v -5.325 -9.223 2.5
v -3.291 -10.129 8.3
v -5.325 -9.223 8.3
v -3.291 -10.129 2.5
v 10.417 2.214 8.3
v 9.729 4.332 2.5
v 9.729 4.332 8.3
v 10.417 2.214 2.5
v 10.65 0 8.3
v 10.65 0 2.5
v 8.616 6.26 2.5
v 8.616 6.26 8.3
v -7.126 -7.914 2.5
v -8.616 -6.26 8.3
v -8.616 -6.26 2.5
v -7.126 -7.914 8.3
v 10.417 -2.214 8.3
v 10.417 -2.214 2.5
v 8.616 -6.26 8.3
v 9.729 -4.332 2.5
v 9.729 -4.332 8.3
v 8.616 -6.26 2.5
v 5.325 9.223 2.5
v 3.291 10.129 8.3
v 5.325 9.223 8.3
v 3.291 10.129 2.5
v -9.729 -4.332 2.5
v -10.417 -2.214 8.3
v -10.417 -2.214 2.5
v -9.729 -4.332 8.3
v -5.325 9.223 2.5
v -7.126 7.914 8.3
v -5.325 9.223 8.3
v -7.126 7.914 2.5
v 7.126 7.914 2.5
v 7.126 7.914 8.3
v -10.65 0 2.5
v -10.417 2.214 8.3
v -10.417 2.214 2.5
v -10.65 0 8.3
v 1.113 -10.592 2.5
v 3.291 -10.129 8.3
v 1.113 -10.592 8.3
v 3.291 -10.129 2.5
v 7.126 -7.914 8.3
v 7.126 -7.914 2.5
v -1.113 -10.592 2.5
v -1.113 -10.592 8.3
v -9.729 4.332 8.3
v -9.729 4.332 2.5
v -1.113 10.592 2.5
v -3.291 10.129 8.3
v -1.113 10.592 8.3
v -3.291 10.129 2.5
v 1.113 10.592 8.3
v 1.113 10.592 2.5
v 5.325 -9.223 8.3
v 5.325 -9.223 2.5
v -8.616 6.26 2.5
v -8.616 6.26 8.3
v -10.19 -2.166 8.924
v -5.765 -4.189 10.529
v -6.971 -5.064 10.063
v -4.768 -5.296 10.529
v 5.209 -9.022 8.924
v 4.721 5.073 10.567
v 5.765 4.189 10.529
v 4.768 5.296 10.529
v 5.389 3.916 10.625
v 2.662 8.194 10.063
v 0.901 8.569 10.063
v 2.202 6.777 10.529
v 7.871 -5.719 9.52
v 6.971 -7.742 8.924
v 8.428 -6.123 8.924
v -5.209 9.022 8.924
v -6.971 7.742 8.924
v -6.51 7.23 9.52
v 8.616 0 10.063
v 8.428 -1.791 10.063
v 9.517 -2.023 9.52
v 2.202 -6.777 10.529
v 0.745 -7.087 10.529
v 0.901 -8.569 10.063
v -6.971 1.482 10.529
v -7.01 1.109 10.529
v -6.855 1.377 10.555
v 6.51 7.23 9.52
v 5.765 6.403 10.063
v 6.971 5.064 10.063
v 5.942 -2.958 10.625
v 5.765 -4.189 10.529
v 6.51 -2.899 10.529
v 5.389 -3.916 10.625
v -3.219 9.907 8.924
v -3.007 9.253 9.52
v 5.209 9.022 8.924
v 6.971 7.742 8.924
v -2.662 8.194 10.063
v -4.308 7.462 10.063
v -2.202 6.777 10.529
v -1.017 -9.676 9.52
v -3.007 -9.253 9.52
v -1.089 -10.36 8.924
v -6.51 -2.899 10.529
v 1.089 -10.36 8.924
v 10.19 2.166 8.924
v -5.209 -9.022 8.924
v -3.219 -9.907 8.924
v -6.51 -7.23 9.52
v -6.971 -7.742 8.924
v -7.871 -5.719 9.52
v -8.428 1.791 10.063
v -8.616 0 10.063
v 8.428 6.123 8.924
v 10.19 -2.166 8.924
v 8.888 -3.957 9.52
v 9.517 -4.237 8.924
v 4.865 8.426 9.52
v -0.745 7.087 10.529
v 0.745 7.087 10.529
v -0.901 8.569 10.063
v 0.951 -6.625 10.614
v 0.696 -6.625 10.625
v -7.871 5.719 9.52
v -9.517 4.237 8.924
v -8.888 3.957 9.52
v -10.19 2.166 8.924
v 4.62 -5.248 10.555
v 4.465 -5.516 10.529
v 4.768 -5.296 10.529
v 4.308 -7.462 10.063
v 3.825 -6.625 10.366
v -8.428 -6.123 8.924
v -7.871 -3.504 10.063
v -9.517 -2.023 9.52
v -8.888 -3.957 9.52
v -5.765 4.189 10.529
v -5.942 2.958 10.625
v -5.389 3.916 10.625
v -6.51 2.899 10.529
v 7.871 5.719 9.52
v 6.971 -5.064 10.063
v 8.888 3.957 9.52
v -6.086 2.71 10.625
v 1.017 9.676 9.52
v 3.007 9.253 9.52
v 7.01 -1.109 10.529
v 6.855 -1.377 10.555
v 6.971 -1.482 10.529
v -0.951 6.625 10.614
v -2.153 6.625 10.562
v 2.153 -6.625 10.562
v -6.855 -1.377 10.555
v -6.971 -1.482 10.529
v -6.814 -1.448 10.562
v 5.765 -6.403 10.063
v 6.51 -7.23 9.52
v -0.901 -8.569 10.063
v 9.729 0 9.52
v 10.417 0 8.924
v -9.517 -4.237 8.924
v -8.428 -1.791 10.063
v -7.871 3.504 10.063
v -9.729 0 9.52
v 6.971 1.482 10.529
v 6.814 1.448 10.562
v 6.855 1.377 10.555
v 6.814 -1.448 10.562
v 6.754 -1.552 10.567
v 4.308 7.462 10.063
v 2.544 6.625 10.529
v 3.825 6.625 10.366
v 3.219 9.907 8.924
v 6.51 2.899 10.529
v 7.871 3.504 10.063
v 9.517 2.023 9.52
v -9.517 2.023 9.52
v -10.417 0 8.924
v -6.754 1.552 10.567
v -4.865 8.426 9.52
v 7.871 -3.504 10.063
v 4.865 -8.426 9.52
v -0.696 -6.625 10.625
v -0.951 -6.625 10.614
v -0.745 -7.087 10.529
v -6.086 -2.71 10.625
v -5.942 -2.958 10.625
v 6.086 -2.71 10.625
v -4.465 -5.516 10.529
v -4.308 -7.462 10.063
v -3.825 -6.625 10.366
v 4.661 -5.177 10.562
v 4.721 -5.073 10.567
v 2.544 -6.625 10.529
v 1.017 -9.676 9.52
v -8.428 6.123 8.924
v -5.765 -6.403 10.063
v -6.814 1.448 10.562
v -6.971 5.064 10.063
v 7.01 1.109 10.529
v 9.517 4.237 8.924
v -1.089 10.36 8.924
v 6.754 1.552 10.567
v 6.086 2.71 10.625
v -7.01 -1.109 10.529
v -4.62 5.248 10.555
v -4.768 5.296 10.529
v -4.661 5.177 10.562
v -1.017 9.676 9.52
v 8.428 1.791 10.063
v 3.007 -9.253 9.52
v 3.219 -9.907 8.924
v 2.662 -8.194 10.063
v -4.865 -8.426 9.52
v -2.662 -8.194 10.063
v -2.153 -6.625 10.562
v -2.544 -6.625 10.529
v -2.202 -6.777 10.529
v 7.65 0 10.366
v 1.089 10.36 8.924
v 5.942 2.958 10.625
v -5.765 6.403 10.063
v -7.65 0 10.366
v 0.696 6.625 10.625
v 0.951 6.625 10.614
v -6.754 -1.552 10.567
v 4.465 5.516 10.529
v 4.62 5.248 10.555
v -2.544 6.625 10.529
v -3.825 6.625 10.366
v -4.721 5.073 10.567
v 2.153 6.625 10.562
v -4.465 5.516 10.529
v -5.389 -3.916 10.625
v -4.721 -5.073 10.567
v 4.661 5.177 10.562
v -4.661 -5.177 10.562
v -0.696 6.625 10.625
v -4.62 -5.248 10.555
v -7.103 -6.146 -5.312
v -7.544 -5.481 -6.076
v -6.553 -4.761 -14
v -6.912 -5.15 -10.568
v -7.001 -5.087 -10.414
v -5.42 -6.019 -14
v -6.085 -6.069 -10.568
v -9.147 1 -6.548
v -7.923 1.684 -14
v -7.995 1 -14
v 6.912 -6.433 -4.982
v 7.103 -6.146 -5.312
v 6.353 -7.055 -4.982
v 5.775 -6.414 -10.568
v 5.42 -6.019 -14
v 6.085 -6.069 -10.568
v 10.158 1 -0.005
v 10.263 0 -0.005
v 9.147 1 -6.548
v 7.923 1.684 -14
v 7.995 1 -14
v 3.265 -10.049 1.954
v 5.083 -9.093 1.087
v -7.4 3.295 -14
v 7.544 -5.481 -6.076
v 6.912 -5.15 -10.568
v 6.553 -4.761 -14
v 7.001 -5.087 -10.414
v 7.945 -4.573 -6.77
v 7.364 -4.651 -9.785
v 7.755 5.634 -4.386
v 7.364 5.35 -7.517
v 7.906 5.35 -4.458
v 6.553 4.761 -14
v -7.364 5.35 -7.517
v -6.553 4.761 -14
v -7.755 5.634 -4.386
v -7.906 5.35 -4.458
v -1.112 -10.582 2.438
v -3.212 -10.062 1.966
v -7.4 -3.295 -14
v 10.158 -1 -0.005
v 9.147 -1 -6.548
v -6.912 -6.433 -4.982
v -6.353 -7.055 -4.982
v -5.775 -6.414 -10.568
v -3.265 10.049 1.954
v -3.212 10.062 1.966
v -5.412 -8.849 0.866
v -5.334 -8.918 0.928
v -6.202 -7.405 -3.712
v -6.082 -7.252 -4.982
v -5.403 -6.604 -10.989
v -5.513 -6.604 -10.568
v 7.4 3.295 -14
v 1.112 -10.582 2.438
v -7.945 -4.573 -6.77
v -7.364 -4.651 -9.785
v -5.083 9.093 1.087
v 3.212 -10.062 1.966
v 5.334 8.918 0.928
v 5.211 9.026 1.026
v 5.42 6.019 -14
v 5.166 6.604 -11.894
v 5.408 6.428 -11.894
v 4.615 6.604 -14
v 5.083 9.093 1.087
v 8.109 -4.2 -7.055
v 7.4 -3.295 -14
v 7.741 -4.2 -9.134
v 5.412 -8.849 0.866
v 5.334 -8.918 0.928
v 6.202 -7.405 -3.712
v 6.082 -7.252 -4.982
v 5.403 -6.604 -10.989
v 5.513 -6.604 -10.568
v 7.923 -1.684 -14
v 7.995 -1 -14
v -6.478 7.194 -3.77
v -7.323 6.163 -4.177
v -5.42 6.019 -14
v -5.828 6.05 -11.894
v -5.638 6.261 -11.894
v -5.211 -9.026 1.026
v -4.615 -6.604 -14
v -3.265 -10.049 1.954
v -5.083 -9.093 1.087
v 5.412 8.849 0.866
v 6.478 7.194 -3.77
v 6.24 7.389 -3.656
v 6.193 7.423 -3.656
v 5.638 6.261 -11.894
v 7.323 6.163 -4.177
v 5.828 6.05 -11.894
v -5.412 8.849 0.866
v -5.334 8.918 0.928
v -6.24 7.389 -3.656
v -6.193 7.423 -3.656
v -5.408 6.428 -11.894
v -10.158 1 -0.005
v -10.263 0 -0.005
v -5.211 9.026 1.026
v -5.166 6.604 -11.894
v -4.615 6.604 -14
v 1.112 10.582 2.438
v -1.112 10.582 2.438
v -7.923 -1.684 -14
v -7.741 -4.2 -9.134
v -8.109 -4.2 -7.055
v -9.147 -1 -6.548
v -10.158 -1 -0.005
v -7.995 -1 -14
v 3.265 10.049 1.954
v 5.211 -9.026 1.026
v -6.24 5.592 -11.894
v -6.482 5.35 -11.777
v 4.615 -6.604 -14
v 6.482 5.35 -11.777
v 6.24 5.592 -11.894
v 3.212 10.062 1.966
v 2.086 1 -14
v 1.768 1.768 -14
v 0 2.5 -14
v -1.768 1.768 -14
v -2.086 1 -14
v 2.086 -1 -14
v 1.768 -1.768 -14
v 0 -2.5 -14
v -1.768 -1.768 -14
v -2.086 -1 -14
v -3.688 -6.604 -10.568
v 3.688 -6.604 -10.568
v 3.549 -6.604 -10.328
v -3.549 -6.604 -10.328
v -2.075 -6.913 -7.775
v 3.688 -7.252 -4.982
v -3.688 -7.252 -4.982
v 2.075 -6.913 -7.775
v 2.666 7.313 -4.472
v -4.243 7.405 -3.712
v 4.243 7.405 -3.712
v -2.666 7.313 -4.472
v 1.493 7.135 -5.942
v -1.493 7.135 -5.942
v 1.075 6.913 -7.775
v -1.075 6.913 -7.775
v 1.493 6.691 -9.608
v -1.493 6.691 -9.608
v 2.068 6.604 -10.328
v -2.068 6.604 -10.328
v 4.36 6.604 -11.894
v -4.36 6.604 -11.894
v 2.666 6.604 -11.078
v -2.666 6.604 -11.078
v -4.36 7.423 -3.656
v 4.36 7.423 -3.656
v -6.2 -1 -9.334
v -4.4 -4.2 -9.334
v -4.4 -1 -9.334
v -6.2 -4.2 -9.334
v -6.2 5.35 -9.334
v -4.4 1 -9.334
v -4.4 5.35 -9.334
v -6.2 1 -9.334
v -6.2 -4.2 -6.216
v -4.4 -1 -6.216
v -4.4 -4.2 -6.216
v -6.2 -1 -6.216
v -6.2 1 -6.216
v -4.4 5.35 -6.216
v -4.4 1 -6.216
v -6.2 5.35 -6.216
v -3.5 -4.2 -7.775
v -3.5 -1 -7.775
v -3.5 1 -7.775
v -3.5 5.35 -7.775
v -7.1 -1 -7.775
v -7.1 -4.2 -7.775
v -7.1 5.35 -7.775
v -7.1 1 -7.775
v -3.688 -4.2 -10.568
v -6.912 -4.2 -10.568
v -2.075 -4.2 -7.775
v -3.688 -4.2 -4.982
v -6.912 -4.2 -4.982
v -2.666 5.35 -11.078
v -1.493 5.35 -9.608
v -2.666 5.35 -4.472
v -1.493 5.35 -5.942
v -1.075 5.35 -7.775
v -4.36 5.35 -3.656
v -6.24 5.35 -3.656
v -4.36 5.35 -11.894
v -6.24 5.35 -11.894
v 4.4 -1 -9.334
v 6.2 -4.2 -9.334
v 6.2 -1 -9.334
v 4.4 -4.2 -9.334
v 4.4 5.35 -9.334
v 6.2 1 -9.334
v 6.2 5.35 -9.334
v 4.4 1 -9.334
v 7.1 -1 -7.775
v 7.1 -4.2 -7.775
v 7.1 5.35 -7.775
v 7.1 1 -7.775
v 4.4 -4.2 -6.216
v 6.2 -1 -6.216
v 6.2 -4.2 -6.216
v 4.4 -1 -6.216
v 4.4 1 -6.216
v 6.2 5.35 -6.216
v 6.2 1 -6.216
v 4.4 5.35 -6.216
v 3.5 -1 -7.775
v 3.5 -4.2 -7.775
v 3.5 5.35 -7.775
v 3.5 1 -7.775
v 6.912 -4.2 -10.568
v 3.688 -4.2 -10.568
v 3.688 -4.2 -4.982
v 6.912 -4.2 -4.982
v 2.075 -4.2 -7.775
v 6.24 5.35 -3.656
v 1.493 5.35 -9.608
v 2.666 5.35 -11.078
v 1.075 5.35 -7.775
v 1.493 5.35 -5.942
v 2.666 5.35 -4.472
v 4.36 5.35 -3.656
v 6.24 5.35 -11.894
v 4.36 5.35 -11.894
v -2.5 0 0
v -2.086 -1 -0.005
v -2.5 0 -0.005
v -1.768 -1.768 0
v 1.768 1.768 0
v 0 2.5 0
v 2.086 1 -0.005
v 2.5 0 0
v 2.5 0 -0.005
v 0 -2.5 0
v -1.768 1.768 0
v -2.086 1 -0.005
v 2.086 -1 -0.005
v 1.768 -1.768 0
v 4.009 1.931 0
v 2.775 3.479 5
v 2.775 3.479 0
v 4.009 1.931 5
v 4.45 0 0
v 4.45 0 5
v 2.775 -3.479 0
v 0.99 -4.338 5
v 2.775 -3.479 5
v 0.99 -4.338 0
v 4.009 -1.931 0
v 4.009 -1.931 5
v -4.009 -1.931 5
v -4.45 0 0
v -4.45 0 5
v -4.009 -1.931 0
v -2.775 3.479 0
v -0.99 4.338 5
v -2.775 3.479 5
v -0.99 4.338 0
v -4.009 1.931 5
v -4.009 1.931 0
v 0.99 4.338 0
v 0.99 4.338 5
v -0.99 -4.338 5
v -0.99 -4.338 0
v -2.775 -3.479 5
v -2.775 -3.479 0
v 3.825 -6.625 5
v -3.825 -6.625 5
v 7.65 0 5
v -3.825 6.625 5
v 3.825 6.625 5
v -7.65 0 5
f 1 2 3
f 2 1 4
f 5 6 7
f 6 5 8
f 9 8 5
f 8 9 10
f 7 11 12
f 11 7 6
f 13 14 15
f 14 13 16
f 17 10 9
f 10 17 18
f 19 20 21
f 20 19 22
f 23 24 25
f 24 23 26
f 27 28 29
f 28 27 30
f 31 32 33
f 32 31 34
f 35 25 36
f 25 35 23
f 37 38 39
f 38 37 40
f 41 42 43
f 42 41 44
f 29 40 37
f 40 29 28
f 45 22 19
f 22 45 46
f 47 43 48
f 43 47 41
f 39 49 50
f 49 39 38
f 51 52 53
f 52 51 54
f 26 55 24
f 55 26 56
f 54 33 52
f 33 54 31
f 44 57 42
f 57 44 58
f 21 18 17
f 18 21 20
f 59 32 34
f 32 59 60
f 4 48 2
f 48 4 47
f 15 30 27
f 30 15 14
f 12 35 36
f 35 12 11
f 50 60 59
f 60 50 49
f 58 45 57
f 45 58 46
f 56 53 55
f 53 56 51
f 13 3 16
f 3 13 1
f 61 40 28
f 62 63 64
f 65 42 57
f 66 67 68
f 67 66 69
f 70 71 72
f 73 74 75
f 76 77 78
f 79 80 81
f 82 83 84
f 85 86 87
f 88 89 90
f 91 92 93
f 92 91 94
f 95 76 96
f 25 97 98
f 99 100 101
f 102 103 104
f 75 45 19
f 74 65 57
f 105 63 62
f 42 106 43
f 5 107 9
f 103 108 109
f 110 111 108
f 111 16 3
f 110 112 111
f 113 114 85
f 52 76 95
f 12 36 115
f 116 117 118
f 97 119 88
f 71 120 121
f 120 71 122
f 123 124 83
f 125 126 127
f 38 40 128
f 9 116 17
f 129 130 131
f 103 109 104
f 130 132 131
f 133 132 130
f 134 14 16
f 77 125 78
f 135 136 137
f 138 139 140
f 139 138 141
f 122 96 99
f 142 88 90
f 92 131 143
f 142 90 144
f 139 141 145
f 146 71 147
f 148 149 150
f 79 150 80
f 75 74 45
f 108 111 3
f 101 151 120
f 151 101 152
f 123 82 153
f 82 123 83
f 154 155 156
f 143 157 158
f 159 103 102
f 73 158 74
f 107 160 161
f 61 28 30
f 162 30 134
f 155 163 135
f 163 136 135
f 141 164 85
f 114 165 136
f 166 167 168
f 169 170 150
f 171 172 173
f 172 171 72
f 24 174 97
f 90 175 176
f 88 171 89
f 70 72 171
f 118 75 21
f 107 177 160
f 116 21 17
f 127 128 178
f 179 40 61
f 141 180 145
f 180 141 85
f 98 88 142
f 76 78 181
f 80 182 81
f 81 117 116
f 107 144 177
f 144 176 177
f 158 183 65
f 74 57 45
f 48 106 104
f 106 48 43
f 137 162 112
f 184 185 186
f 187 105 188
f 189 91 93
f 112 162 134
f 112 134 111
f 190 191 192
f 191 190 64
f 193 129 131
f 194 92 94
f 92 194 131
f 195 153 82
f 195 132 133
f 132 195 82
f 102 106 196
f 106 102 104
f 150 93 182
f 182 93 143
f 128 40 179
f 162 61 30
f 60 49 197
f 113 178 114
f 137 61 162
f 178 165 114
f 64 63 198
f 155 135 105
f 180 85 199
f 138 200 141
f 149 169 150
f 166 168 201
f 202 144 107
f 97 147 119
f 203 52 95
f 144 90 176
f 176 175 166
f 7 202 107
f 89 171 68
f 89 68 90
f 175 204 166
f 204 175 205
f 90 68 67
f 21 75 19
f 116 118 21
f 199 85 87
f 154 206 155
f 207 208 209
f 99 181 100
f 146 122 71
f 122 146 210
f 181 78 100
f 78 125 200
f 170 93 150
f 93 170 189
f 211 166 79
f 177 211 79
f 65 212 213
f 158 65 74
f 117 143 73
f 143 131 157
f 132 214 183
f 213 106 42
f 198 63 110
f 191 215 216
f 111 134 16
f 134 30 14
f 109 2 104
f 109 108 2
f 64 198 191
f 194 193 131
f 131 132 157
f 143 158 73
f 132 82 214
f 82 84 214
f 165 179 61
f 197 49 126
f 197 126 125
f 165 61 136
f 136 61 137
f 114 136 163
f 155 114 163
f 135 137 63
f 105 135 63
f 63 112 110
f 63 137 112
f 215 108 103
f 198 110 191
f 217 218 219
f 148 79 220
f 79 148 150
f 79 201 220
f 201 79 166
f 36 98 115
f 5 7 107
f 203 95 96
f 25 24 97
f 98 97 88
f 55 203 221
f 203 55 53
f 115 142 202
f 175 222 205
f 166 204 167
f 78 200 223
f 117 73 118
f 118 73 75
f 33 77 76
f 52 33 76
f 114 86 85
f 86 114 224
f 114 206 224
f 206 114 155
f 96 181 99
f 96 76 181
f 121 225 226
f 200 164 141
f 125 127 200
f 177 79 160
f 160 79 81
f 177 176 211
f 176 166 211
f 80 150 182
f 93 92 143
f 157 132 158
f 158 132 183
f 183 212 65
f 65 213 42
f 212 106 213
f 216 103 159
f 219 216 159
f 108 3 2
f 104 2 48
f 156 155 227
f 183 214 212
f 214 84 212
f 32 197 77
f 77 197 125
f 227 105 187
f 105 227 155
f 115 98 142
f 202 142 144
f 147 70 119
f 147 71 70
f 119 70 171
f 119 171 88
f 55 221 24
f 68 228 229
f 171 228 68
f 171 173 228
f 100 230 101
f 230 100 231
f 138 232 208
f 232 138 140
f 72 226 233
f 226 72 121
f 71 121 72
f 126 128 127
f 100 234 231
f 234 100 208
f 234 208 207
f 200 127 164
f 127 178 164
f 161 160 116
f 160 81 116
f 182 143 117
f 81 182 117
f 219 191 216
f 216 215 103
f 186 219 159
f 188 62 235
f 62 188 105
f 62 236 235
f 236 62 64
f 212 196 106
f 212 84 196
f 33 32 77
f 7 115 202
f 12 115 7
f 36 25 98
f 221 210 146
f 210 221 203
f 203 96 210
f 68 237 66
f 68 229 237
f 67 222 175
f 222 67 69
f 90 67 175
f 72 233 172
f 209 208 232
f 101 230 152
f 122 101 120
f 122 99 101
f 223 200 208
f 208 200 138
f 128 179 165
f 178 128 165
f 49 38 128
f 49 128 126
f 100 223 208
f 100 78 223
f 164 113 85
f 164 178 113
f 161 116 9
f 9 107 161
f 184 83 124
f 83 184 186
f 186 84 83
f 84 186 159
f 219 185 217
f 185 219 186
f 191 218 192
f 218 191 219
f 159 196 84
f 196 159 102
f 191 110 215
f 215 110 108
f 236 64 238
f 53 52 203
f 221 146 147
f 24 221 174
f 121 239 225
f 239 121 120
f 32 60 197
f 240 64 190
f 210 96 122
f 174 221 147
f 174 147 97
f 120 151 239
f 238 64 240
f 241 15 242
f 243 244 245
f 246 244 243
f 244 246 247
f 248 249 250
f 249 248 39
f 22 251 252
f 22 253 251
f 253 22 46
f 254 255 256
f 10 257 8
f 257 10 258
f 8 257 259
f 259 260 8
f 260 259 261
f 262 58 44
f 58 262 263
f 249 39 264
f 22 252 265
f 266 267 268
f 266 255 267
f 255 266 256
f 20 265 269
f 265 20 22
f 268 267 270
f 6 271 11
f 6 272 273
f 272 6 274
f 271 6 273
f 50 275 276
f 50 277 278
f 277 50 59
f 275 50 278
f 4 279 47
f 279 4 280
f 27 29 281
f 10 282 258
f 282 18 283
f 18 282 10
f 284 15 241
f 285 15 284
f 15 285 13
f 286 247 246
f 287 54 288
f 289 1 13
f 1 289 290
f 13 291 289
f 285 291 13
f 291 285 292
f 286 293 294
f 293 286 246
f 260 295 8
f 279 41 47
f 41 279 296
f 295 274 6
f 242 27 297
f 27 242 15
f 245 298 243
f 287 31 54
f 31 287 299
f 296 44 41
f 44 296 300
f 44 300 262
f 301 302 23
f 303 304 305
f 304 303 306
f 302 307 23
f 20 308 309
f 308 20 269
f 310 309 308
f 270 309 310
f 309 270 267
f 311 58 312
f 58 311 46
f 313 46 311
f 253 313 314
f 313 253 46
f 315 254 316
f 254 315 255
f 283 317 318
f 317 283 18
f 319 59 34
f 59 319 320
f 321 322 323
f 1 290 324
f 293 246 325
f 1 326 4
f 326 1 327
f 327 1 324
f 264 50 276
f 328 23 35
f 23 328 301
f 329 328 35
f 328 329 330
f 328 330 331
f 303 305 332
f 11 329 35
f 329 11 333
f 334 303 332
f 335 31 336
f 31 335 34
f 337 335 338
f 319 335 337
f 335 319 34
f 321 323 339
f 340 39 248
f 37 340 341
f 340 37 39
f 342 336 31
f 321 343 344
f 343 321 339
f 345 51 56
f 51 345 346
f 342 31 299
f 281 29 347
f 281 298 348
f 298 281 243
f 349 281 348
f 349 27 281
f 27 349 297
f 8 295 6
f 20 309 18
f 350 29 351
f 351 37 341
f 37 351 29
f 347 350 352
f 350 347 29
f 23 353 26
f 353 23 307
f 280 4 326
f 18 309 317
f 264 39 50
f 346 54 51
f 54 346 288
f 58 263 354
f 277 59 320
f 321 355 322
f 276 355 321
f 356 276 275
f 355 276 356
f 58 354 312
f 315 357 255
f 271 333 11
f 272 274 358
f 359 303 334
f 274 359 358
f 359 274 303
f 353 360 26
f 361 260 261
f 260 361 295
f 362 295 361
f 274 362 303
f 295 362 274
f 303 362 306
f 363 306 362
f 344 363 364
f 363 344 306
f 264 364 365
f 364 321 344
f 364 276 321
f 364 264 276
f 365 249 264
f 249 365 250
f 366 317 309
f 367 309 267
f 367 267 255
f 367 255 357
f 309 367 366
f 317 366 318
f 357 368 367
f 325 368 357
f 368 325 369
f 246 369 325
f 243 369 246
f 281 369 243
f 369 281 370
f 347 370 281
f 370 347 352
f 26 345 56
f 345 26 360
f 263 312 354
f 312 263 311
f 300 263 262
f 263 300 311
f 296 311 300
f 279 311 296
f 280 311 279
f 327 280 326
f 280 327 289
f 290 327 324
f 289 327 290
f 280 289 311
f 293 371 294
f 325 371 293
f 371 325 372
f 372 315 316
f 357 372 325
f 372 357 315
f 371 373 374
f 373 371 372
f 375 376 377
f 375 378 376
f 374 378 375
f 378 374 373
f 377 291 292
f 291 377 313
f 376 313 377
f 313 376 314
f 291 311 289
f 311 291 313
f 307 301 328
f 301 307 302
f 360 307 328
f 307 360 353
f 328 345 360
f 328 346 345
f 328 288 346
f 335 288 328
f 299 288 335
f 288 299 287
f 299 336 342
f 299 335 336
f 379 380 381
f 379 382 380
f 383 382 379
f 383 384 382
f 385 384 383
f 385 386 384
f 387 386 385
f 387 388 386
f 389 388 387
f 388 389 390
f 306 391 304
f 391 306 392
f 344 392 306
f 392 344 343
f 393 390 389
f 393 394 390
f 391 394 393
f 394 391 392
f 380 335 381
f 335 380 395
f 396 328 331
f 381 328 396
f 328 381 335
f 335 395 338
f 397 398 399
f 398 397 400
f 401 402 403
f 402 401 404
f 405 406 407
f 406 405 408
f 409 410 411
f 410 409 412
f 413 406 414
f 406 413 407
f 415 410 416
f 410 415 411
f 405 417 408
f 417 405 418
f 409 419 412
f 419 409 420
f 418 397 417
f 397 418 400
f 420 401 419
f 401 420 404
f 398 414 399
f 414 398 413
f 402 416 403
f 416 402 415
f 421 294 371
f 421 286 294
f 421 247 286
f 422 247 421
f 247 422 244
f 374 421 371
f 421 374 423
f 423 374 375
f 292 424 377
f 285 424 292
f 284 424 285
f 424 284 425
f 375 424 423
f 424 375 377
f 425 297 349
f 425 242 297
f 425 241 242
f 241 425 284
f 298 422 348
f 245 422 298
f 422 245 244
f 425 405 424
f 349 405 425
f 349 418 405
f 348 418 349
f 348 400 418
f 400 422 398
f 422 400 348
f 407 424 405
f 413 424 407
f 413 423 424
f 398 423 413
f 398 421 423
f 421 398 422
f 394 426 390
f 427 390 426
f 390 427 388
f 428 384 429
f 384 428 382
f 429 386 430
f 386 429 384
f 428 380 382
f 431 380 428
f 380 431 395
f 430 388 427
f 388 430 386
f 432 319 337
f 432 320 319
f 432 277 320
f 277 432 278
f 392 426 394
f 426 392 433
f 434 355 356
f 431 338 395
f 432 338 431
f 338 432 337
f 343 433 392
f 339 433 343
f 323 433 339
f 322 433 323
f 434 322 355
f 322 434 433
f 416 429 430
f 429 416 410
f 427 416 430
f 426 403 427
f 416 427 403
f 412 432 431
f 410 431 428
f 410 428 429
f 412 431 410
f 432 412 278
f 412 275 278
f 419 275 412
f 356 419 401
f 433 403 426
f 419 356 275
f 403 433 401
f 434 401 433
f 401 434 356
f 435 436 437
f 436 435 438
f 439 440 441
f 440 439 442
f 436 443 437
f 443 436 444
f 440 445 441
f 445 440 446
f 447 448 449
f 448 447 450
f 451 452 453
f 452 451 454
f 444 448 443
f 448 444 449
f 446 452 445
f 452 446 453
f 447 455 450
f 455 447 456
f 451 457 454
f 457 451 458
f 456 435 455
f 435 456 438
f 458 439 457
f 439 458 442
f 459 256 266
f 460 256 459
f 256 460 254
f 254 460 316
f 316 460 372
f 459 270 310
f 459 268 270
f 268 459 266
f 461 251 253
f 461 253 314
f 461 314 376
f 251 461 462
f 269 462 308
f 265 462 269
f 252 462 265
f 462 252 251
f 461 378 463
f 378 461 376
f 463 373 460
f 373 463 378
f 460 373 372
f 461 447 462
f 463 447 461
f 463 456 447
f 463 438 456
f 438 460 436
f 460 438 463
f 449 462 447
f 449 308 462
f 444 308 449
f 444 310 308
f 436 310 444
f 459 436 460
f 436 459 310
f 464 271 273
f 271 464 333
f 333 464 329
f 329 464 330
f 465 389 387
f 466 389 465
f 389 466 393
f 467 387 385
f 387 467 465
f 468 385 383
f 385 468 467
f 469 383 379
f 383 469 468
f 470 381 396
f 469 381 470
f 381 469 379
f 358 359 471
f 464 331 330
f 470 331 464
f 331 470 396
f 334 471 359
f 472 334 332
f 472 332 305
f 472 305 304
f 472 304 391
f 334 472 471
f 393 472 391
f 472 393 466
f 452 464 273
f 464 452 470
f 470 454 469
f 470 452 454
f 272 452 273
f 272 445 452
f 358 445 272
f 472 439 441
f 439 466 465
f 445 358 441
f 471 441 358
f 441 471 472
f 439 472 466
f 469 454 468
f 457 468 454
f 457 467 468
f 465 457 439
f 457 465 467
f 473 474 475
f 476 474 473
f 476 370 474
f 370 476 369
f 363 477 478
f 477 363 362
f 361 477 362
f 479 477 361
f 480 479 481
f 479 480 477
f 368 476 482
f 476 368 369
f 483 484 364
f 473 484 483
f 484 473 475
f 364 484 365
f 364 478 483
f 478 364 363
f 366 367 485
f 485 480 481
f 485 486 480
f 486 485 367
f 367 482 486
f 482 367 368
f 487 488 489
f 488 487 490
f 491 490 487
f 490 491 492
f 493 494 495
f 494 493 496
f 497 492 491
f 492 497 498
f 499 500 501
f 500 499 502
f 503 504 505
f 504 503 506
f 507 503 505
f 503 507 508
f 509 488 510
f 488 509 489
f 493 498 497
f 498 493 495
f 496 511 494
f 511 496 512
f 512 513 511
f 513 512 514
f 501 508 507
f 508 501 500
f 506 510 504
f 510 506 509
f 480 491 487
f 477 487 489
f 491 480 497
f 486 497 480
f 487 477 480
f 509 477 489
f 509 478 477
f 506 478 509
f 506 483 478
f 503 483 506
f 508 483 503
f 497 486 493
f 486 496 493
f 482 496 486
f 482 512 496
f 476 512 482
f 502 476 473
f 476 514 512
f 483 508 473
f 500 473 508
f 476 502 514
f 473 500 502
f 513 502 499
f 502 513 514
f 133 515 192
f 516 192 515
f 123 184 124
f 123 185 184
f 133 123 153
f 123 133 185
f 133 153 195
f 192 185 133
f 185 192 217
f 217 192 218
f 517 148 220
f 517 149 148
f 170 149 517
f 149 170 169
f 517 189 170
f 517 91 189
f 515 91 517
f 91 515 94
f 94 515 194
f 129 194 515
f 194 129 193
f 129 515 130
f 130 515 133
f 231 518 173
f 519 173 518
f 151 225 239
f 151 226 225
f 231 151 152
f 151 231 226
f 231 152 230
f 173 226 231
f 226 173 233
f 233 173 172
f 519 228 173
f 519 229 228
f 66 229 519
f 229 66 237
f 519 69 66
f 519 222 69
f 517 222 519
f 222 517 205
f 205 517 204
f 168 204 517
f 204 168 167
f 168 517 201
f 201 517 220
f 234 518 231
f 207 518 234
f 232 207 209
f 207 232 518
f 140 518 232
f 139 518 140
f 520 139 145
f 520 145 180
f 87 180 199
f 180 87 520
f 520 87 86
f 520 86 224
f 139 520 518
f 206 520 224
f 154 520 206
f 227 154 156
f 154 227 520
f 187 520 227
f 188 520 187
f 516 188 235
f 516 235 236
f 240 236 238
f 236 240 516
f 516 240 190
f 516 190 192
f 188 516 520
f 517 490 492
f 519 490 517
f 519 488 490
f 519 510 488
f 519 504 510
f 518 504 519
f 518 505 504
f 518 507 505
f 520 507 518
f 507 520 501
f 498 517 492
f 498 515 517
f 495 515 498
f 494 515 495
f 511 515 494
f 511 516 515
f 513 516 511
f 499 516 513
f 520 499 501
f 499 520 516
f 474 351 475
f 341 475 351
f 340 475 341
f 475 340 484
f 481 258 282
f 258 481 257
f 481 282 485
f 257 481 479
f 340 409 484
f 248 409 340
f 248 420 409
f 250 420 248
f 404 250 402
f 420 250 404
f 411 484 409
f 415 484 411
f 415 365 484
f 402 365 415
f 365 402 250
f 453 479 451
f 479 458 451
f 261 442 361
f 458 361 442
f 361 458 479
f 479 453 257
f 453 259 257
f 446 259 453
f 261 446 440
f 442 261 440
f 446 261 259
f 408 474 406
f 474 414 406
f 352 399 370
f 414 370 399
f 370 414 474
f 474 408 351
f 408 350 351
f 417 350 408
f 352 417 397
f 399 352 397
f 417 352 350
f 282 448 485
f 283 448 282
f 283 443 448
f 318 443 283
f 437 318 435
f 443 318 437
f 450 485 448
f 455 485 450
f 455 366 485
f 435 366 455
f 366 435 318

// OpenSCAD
// file: teardrop.scad
module teardrop (r=4.5,h=20,top_and_bottom=false)
{
	rotate([-270,0,90])
	linear_extrude(height=h,convexity=10)
	{
		circle(r=r);
		polygon(points=[[0,0],[r*cos(30),r*sin(30)],[0.5*r,r],[-0.5*r,r],[-r*cos(30),r*sin(30)]],
				paths=[[0,1,2,3,4]]);
		if (top_and_bottom)
		polygon(points=[[0,0],[r*cos(30),-r*sin(30)],[0.5*r,-r],[-0.5*r,-r],[-r*cos(30),-r*sin(30)]],
				paths=[[0,1,2,3,4]]);
		
	}
}

module teardropcentering (r=4.5,h=20)
{
	rotate([-270,0,90])
	linear_extrude(height=h)
	{
		circle(r=r, $fn = 24);
		polygon(points=[[0,0],[r*cos(30),r*sin(30)],[0.5*r,1.2*r],[-0.5*r,1.2*r],[-r*cos(30),r*sin(30)]],
				paths=[[0,1,2,3,4]]);
	}
}

module teardropcentering2 (r=4.5,h=20)
{
	//rotate([-270,0,90])
	difference(){
	linear_extrude(height=h)
	{
		circle(r=r, $fn = 24);
		polygon(points=[[0,0],[r*cos(30),r*sin(30)],[0.5*r,1.2*r],[-0.5*r,1.2*r],[-r*cos(30),r*sin(30)]],
				paths=[[0,1,2,3,4]]);
	}
	translate(v = [-1.5*r, -1.5*r,-1])cube(size =[3*r,1.5*r,h+2]);
	}
}
// file: barbell.scad
/*
 *  This program is free software; you can redistribute it and/or modify
 *  it under the terms of the GNU General Public License as published by
 *  the Free Software Foundation; either version 3 of the License,
 *  LGPL version 2.1, or (at your option) any later version of the GPL.
 *
 *  This program is distributed in the hope that it will be useful,
 *  but WITHOUT ANY WARRANTY; without even the implied warranty of
 *  MERCHANTABILITY or FITNESS FOR A PARTICULAR PURPOSE.  See the
 *  GNU General Public License for more details.
 *
 *  You should have received a copy of the GNU General Public License
 *  along with this program; if not, write to the Free Software
 *  Foundation, Inc., 59 Temple Place, Suite 330, Boston, MA 02111-1307 USA
 *
*/

module barbell (r1,r2,r3,r4,separation) 
{
	x1=[0,0];
	x2=[separation,0];
	x3=triangulate (x1,x2,r1+r3,r2+r3);
	x4=triangulate (x2,x1,r2+r4,r1+r4);
	render()
	difference ()
	{
		union()
		{
			translate(x1)
			circle (r=r1);
			translate(x2)
			circle(r=r2);
			polygon (points=[x1,x3,x2,x4]);
		}
		translate(x3)
		circle(r=r3,$fa=5);
		translate(x4)
		circle(r=r4,$fa=5);
	}
}


function triangulate (point1, point2, length1, length2) = 
point1 + 
length1*rotated(
atan2(point2[1]-point1[1],point2[0]-point1[0])+
angle(distance(point1,point2),length1,length2));

function distance(point1,point2)=
sqrt((point1[0]-point2[0])*(point1[0]-point2[0])+
(point1[1]-point2[1])*(point1[1]-point2[1]));

function angle(a,b,c) = acos((a*a+b*b-c*c)/(2*a*b)); 

function rotated(a)=[cos(a),sin(a),0];
// file: utilities.scad
/*
 * Utility functions.
 *
 * Originally by Hans Häggström, 2010.
 * Dual licenced under Creative Commons Attribution-Share Alike 3.0 and LGPL2 or later
 */

//include <units.scad>


/******************** Disance Poins ******************************/
function distance3D(a,b) =sqrt( (a[0] - b[0])*(a[0] - b[0]) +
                                (a[1] - b[1])*(a[1] - b[1]) +
                                (a[2] - b[2])*(a[2] - b[2]) );
//Obsolet
function distance(a, b) = distance3D(a,b);

function distance2D(a,b) = sqrt( (a[0] - b[0])*(a[0] - b[0]) +
                                (a[1] - b[1])*(a[1] - b[1]));
								
function distance1D(a,b) = sqrt(a*a+b*b);
//Obsolet
function length2(a) = distance1D(a[0],a[1]);


/************************ vector *************************/
function normalized(a) = a / (max(distance3D([0,0,0], a), 0.00001));

function normalized_axis(a) = a == "x" ? [1, 0, 0]:
                   a == "y" ? [0, 1, 0]:
                   a == "z" ? [0, 0, 1]: normalized(a);

function angleOfNormalizedVector(n) = [0, -atan2(n[2], distance1D([n[0], n[1]])), atan2(n[1], n[0]) ];

function angle(v) = angleOfNormalizedVector(normalized(v));

function angleBetweenTwoPoints(a, b) = angle(normalized(b-a));

function _angleVectore2D(a) = atan2(a[0],a[1]);
function angle_betweentTwoPoints2D (a,b) = _angleVectore2D(b-a);


/********************** Circel ***************************/

function circel_area(r) = PI * r * r;

function circel_radius3Points(a,b,c) = (distance2D(a,b) * distance2D(b,c) * distance2D(c,a)) / (4 * triangle_area3Points(a,b,c));

function circel_radius3lengths(a,b,c) = (a*b*c) / (4 * triangle_area3lengths(a,b,c));


/********************** triangle **************************/
//Satz des Heron
function triangle_area3lengths(a,b,c) = sqrt((a+b+c)*(a+b-c)*(b+c-a)*(c+a-b))/4;

function triangle_area3Points(a,b,c) = triangle_area3lengths(distance2D(a,b),distance2D(b,c),distance2D(c,a));



/************************** coordinate systems translation ****/
//[radius,phi] <=> [x,y]
function conv2D_cartesian2polar(x) = [ distance1D(x[0],x[1]) , atan2(x[1],x[0]) ];
function conv2D_polar2cartesian(x) = [ x[0]*cos(x[1]) , x[0]*sin(x[1]) ];


CENTER = 0;
LEFT = -0.5;
RIGHT = 0.5;
TOP = 0.5;
BOTTOM = -0.5;

FlatCap =0;
ExtendedCap =0.5;
CutCap =-0.5;


module fromTo(from=[0,0,0], to=[1,0,0], size=[1, 1], align=[CENTER, CENTER], material=[0.5, 0.5, 0.5], name="", endExtras=[0,0], endCaps=[FlatCap, FlatCap], rotation=[0,0,0], printString=true) {

  angle = angleBetweenTwoPoints(from, to);
  length = distance(from, to) + endCaps[0]*size[0] + endCaps[1]*size[0] + endExtras[0] + endExtras[1];

  if (length > 0) {
    if (printString) echo(str( "  " ,name, " ", size[0], "mm x ", size[1], "mm, length ", length, "mm"));

    color(material)
      translate(from)
        rotate(angle)
          translate( [ -endCaps[0]*size[0] - endExtras[0], size[0]*(-0.5-align[0]), size[1]*(-0.5+align[1]) ] )
            rotate(rotation)
              scale([length, size[0], size[1]]) child();
  }
}

module part(name) {
  echo("");
  echo(str(name, ":"));
}
// file: roundEdges.scad
/* roundEdges
 * Copyright (c) 2012 by Krallinger Sebastian [s.krallinger+cc@gmail.com]
 * Dual-licensed under 
 * Creative Commons Attribution-ShareAlike 3.0 (CC BY-SA) [http://creativecommons.org/licenses/by-sa/3.0/]
 * and
 * LGPL v2 or later [http://www.gnu.org/licenses/].
 */


//Rounded Edges
module roundEdge(_a=0,_r=1,_l=1,_fn=100){
	rotate (a=[0,0,_a]){
		translate(v=[_r,_r,0]){
			rotate (a=[0,0,0]) rotate (a=[0,0,180]){
				difference() {
					translate (v=[-OS/2,-OS/2,-OS/2])
						cube (size = [_r+OS,_r+OS,_l+OS],center=false );
					translate (v=[0,0,-OS*2/2])
						cylinder (h = _l+OS*2, r=_r, center = false, $fn=_fn);
				}
			}
		}
	}
}
//roundEdge(_a=0,_l=10);
// file: metric.scad
// PRUSA Mendel  
// Default metric sizes
// GNU GPL v2
// Josef Průša
// josefprusa@me.com
// prusadjs.cz
// http://www.reprap.org/wiki/Prusa_Mendel
// http://github.com/prusajr/PrusaMendel

// RODS

threaded_rod_diameter      = 8.2;
smooth_bar_diameter        = 8;

// Nuts and bolts
// For all nuttraps and screw holse 
m8_diameter                = 8.9;
m8_nut_diameter            = 15.3;
m8_nut_wallDist            = _wallDistFromDia(m8_nut_diameter);
m8_nut_heigth              = 6.3;

m4_diameter                = 4.5;
m4_nut_diameter            = 8.2;
m4_nut_heigth              = 3.2;

m3_diameter                = 3.6;
m3_nut_diameter            = 6.45;
m3_nut_heigth              = 2.3;
m3_nut_wallDist            = _wallDistFromDia(m3_nut_diameter);
m3_nut_diameter_horizontal = 6.1;

// elongetaed nuttraps
// where a nut is put in an slot and inthere hits the perpendicular threadhole
m3_elongNtt_tolerance      = [0.5,0,0.5];// additional [diameter,depth,height]  // depth is not implemented


/******************************************************************************/ 
/*                                  INTERNAL                                  */
/******************************************************************************/
/*-----------------!!! do not change things below this !!!--------------------*/
m3_elongNtt_diameter = m3_nut_diameter + m3_elongNtt_tolerance[0];
m3_elongNtt_wallDist = _wallDistFromDia(m3_elongNtt_diameter);
m3_elongNtt_height = m3_nut_heigth + m3_elongNtt_tolerance[2];



function _wallDistFromDia(dia) = cos(30)*dia;
// file: units.scad
/*
 * Basic units.
 * 
 * Originally by Hans Häggström, 2010.
 * Dual licenced under Creative Commons Attribution-Share Alike 3.0 and LGPL2 or later
 */


mm = 1;
cm = 10 * mm;
dm = 100 * mm;
m = 1000 * mm;

inch = 25.4 * mm;

X = [1, 0, 0];
Y = [0, 1, 0];
Z = [0, 0, 1];

M3 = 3*mm;
M4 = 4*mm;
M5 = 5*mm;
M6 = 6*mm;
M8 = 8*mm;


// When a small distance is needed to overlap shapes for boolean cutting, etc.
epsilon = 0.01*mm;
OS = epsilon;  // Over size
// main file
/* H-Z-Coupling [Zc]
 * Copyright (c) 2012 by Krallinger Sebastian [s.krallinger+cc@gmail.com]
 * Dual-licensed under 
 * Creative Commons Attribution-ShareAlike 3.0 (CC BY-SA) [http://creativecommons.org/licenses/by-sa/3.0/]
 * and
 * LGPL v2 or later [http://www.gnu.org/licenses/].
 */

include <units.scad>;
include <metric.scad>
include <roundEdges.scad>
include <utilities.scad>
include <barbell.scad>
use <teardrop.scad>


/*------------------------------------general---------------------------------*/
Zc_mode = "-";
//Zc_mode = "printSet";  $fn=24*4;    // can be print or inspect [overlays the Zc_model with the original Zc_model] (uncomment next line)
//Zc_mode = "print";  $fn=24*4;
Zc_mode = "inspect";
//Zc_mode = "assembly";

Zc_thinWallThickness         = 1;
Zc_genWallThickness          = 3;
Zc_strongWallThickness       = 9;

Zc_horizontalSuportThickness = 0.3;
Zc_verticalSupportThickness  = 0.5;


Zc_shaftNut_dist          = 5; // distance between end of motor shaft and the lower edge of the first nut
Zc_slot_width             = 2; 

/*------------------------------------rod-------------------------------------*/
Zc_rod_diam               = m8_diameter;
Zc_nut_diam               = m8_nut_diameter;
Zc_nut_height             = m8_nut_heigth;

/*------------------------------------motor-----------------------------------*/
Zc_motorShaft_diam        = 5;
Zc_motorShaftCover_length = 14;

/*------------------------------------screw-----------------------------------*/
Zc_screwHolde_diam        = m3_diameter;
Zc_screwNut_diam          = m3_nut_diameter;
ZC_screwNut_height        = m3_nut_heigth;
Zc_screwNut_clearency     = 1;

/******************************************************************************/ 
/*                                  INTERNAL                                  */
/******************************************************************************/
_Zc_overalHeight         = Zc_nut_height + Zc_shaftNut_dist + Zc_motorShaftCover_length;
_Zc_outer_r              = Zc_nut_diam/2+Zc_genWallThickness;

_Zc_slotYdirWall_offset  = Zc_slot_width/2 + Zc_motorShaft_diam/2 + Zc_genWallThickness;

_Zc_coutout_r            = _Zc_outer_r - _Zc_slotYdirWall_offset;
_Zc_zdirCutout_scale     = (Zc_motorShaftCover_length+Zc_shaftNut_dist/2)/_Zc_coutout_r;

_Zc_zdirTopCloseOf_scale = (Zc_genWallThickness)/_Zc_outer_r;

module H_Z_Coupling() {

	intersection() {
		difference() {
			union(){
				// upper oultine
				translate([0, 0, Zc_shaftNut_dist/2]) 
					cylinder(r=_Zc_outer_r, h=Zc_nut_height + Zc_shaftNut_dist/2 - Zc_genWallThickness, center=false);

				// upper close off
				translate([0, 0, Zc_shaftNut_dist+Zc_nut_height - Zc_genWallThickness]) 
				scale([1, 1, _Zc_zdirTopCloseOf_scale]) 
					sphere(r=_Zc_outer_r);

				// lower outline
				translate([0, 0, -Zc_motorShaftCover_length]) 
					cylinder(r1=Zc_motorShaft_diam/2 + Zc_thinWallThickness+Zc_screwHolde_diam+Zc_thinWallThickness, r2=_Zc_outer_r, h=Zc_motorShaftCover_length+Zc_shaftNut_dist/2, center=false);
			}
			union(){
				// material coutout
				translate([0, 0, -Zc_motorShaftCover_length]) 
				for (y=[-_Zc_outer_r,_Zc_outer_r]) 
				translate([0, y, 0]) 
				scale([1, 1, _Zc_zdirCutout_scale]) 
				rotate(a=90,v=Y) 
					cylinder(r=_Zc_coutout_r, h=5*Zc_nut_diam, center=true);

				// motorshaft
				translate([0, 0, -Zc_motorShaftCover_length-OS]) 
					cylinder(r=Zc_motorShaft_diam/2, h=Zc_motorShaftCover_length+2*OS, center=false);

				//zaxis
				cylinder(r=Zc_rod_diam/2, h=Zc_nut_height + Zc_shaftNut_dist +OS, center=false);

				// nut coutout
				translate([0, 0, Zc_shaftNut_dist]) 
					cylinder(r=m8_nut_diameter/2, h=Zc_nut_height+OS, center=false,$fn=6);

				// slot
				translate([0, 0, -Zc_motorShaftCover_length/2-OS]) 
				cube(size=[5*Zc_nut_diam, Zc_slot_width, Zc_motorShaftCover_length+OS], center=true);

				// screw holse
				translate([0, 0, -Zc_motorShaftCover_length+Zc_genWallThickness+Zc_screwNut_diam/2]) 
				for (x=[-Zc_motorShaft_diam/2-Zc_thinWallThickness- Zc_screwHolde_diam/2,Zc_motorShaft_diam/2 + Zc_thinWallThickness+Zc_screwHolde_diam/2]) {
					//screw holes
					translate([x, 0, 0]) 
					rotate(a=90,v=X)
						cylinder(r=Zc_screwHolde_diam/2, h=5*Zc_nut_diam, center=true); 

					// nuttrap
					translate([x, -Zc_nut_diam*2.5- _Zc_slotYdirWall_offset + ZC_screwNut_height , 0]) 
					rotate(a=90,v=X)
						cylinder(r=Zc_screwNut_diam/2, h=5*Zc_nut_diam, center=true,$fn=6); 

					// nut clearany
					translate([x, Zc_nut_diam*2.5+ _Zc_slotYdirWall_offset -ZC_screwNut_height/2, 0]) 
					rotate(a=90,v=X)
						cylinder(r=Zc_screwNut_diam/2 + Zc_screwNut_clearency, h=5*Zc_nut_diam, center=true); 
				}
			}
		}
		translate([-Zc_nut_diam*2.5, -Zc_nut_diam*2.5, -Zc_motorShaftCover_length]) 
			cube(size=[Zc_nut_diam*5, Zc_nut_diam*5, _Zc_overalHeight], center=false);
	}
	
	
}




if (Zc_mode == "inspect") {
	H_Z_Coupling();
}
module H_Z_Coupling_print() {
	H_Z_Coupling();
}
module H_Z_Coupling_printSet() {
	translate([0, 0, Zc_motorShaftCover_length]) {
		translate([-_Zc_outer_r - 1, 0, 0]) 
			H_Z_Coupling();
		translate([_Zc_outer_r + 1, 0, 0]) 
			H_Z_Coupling();
	}
}
if (Zc_mode == "printSet") {
	H_Z_Coupling_printSet();
}
if (Zc_mode == "print") {
	translate([0, 0, Zc_motorShaftCover_length]) 
		H_Z_Coupling();
}



/*------------------------------------assembly--------------------------------*/
module _H_Z_Coupling_assembly() {
	H_Z_Coupling();
}


if (Zc_mode == "assembly"){
	_H_Z_Coupling_assembly();
}
